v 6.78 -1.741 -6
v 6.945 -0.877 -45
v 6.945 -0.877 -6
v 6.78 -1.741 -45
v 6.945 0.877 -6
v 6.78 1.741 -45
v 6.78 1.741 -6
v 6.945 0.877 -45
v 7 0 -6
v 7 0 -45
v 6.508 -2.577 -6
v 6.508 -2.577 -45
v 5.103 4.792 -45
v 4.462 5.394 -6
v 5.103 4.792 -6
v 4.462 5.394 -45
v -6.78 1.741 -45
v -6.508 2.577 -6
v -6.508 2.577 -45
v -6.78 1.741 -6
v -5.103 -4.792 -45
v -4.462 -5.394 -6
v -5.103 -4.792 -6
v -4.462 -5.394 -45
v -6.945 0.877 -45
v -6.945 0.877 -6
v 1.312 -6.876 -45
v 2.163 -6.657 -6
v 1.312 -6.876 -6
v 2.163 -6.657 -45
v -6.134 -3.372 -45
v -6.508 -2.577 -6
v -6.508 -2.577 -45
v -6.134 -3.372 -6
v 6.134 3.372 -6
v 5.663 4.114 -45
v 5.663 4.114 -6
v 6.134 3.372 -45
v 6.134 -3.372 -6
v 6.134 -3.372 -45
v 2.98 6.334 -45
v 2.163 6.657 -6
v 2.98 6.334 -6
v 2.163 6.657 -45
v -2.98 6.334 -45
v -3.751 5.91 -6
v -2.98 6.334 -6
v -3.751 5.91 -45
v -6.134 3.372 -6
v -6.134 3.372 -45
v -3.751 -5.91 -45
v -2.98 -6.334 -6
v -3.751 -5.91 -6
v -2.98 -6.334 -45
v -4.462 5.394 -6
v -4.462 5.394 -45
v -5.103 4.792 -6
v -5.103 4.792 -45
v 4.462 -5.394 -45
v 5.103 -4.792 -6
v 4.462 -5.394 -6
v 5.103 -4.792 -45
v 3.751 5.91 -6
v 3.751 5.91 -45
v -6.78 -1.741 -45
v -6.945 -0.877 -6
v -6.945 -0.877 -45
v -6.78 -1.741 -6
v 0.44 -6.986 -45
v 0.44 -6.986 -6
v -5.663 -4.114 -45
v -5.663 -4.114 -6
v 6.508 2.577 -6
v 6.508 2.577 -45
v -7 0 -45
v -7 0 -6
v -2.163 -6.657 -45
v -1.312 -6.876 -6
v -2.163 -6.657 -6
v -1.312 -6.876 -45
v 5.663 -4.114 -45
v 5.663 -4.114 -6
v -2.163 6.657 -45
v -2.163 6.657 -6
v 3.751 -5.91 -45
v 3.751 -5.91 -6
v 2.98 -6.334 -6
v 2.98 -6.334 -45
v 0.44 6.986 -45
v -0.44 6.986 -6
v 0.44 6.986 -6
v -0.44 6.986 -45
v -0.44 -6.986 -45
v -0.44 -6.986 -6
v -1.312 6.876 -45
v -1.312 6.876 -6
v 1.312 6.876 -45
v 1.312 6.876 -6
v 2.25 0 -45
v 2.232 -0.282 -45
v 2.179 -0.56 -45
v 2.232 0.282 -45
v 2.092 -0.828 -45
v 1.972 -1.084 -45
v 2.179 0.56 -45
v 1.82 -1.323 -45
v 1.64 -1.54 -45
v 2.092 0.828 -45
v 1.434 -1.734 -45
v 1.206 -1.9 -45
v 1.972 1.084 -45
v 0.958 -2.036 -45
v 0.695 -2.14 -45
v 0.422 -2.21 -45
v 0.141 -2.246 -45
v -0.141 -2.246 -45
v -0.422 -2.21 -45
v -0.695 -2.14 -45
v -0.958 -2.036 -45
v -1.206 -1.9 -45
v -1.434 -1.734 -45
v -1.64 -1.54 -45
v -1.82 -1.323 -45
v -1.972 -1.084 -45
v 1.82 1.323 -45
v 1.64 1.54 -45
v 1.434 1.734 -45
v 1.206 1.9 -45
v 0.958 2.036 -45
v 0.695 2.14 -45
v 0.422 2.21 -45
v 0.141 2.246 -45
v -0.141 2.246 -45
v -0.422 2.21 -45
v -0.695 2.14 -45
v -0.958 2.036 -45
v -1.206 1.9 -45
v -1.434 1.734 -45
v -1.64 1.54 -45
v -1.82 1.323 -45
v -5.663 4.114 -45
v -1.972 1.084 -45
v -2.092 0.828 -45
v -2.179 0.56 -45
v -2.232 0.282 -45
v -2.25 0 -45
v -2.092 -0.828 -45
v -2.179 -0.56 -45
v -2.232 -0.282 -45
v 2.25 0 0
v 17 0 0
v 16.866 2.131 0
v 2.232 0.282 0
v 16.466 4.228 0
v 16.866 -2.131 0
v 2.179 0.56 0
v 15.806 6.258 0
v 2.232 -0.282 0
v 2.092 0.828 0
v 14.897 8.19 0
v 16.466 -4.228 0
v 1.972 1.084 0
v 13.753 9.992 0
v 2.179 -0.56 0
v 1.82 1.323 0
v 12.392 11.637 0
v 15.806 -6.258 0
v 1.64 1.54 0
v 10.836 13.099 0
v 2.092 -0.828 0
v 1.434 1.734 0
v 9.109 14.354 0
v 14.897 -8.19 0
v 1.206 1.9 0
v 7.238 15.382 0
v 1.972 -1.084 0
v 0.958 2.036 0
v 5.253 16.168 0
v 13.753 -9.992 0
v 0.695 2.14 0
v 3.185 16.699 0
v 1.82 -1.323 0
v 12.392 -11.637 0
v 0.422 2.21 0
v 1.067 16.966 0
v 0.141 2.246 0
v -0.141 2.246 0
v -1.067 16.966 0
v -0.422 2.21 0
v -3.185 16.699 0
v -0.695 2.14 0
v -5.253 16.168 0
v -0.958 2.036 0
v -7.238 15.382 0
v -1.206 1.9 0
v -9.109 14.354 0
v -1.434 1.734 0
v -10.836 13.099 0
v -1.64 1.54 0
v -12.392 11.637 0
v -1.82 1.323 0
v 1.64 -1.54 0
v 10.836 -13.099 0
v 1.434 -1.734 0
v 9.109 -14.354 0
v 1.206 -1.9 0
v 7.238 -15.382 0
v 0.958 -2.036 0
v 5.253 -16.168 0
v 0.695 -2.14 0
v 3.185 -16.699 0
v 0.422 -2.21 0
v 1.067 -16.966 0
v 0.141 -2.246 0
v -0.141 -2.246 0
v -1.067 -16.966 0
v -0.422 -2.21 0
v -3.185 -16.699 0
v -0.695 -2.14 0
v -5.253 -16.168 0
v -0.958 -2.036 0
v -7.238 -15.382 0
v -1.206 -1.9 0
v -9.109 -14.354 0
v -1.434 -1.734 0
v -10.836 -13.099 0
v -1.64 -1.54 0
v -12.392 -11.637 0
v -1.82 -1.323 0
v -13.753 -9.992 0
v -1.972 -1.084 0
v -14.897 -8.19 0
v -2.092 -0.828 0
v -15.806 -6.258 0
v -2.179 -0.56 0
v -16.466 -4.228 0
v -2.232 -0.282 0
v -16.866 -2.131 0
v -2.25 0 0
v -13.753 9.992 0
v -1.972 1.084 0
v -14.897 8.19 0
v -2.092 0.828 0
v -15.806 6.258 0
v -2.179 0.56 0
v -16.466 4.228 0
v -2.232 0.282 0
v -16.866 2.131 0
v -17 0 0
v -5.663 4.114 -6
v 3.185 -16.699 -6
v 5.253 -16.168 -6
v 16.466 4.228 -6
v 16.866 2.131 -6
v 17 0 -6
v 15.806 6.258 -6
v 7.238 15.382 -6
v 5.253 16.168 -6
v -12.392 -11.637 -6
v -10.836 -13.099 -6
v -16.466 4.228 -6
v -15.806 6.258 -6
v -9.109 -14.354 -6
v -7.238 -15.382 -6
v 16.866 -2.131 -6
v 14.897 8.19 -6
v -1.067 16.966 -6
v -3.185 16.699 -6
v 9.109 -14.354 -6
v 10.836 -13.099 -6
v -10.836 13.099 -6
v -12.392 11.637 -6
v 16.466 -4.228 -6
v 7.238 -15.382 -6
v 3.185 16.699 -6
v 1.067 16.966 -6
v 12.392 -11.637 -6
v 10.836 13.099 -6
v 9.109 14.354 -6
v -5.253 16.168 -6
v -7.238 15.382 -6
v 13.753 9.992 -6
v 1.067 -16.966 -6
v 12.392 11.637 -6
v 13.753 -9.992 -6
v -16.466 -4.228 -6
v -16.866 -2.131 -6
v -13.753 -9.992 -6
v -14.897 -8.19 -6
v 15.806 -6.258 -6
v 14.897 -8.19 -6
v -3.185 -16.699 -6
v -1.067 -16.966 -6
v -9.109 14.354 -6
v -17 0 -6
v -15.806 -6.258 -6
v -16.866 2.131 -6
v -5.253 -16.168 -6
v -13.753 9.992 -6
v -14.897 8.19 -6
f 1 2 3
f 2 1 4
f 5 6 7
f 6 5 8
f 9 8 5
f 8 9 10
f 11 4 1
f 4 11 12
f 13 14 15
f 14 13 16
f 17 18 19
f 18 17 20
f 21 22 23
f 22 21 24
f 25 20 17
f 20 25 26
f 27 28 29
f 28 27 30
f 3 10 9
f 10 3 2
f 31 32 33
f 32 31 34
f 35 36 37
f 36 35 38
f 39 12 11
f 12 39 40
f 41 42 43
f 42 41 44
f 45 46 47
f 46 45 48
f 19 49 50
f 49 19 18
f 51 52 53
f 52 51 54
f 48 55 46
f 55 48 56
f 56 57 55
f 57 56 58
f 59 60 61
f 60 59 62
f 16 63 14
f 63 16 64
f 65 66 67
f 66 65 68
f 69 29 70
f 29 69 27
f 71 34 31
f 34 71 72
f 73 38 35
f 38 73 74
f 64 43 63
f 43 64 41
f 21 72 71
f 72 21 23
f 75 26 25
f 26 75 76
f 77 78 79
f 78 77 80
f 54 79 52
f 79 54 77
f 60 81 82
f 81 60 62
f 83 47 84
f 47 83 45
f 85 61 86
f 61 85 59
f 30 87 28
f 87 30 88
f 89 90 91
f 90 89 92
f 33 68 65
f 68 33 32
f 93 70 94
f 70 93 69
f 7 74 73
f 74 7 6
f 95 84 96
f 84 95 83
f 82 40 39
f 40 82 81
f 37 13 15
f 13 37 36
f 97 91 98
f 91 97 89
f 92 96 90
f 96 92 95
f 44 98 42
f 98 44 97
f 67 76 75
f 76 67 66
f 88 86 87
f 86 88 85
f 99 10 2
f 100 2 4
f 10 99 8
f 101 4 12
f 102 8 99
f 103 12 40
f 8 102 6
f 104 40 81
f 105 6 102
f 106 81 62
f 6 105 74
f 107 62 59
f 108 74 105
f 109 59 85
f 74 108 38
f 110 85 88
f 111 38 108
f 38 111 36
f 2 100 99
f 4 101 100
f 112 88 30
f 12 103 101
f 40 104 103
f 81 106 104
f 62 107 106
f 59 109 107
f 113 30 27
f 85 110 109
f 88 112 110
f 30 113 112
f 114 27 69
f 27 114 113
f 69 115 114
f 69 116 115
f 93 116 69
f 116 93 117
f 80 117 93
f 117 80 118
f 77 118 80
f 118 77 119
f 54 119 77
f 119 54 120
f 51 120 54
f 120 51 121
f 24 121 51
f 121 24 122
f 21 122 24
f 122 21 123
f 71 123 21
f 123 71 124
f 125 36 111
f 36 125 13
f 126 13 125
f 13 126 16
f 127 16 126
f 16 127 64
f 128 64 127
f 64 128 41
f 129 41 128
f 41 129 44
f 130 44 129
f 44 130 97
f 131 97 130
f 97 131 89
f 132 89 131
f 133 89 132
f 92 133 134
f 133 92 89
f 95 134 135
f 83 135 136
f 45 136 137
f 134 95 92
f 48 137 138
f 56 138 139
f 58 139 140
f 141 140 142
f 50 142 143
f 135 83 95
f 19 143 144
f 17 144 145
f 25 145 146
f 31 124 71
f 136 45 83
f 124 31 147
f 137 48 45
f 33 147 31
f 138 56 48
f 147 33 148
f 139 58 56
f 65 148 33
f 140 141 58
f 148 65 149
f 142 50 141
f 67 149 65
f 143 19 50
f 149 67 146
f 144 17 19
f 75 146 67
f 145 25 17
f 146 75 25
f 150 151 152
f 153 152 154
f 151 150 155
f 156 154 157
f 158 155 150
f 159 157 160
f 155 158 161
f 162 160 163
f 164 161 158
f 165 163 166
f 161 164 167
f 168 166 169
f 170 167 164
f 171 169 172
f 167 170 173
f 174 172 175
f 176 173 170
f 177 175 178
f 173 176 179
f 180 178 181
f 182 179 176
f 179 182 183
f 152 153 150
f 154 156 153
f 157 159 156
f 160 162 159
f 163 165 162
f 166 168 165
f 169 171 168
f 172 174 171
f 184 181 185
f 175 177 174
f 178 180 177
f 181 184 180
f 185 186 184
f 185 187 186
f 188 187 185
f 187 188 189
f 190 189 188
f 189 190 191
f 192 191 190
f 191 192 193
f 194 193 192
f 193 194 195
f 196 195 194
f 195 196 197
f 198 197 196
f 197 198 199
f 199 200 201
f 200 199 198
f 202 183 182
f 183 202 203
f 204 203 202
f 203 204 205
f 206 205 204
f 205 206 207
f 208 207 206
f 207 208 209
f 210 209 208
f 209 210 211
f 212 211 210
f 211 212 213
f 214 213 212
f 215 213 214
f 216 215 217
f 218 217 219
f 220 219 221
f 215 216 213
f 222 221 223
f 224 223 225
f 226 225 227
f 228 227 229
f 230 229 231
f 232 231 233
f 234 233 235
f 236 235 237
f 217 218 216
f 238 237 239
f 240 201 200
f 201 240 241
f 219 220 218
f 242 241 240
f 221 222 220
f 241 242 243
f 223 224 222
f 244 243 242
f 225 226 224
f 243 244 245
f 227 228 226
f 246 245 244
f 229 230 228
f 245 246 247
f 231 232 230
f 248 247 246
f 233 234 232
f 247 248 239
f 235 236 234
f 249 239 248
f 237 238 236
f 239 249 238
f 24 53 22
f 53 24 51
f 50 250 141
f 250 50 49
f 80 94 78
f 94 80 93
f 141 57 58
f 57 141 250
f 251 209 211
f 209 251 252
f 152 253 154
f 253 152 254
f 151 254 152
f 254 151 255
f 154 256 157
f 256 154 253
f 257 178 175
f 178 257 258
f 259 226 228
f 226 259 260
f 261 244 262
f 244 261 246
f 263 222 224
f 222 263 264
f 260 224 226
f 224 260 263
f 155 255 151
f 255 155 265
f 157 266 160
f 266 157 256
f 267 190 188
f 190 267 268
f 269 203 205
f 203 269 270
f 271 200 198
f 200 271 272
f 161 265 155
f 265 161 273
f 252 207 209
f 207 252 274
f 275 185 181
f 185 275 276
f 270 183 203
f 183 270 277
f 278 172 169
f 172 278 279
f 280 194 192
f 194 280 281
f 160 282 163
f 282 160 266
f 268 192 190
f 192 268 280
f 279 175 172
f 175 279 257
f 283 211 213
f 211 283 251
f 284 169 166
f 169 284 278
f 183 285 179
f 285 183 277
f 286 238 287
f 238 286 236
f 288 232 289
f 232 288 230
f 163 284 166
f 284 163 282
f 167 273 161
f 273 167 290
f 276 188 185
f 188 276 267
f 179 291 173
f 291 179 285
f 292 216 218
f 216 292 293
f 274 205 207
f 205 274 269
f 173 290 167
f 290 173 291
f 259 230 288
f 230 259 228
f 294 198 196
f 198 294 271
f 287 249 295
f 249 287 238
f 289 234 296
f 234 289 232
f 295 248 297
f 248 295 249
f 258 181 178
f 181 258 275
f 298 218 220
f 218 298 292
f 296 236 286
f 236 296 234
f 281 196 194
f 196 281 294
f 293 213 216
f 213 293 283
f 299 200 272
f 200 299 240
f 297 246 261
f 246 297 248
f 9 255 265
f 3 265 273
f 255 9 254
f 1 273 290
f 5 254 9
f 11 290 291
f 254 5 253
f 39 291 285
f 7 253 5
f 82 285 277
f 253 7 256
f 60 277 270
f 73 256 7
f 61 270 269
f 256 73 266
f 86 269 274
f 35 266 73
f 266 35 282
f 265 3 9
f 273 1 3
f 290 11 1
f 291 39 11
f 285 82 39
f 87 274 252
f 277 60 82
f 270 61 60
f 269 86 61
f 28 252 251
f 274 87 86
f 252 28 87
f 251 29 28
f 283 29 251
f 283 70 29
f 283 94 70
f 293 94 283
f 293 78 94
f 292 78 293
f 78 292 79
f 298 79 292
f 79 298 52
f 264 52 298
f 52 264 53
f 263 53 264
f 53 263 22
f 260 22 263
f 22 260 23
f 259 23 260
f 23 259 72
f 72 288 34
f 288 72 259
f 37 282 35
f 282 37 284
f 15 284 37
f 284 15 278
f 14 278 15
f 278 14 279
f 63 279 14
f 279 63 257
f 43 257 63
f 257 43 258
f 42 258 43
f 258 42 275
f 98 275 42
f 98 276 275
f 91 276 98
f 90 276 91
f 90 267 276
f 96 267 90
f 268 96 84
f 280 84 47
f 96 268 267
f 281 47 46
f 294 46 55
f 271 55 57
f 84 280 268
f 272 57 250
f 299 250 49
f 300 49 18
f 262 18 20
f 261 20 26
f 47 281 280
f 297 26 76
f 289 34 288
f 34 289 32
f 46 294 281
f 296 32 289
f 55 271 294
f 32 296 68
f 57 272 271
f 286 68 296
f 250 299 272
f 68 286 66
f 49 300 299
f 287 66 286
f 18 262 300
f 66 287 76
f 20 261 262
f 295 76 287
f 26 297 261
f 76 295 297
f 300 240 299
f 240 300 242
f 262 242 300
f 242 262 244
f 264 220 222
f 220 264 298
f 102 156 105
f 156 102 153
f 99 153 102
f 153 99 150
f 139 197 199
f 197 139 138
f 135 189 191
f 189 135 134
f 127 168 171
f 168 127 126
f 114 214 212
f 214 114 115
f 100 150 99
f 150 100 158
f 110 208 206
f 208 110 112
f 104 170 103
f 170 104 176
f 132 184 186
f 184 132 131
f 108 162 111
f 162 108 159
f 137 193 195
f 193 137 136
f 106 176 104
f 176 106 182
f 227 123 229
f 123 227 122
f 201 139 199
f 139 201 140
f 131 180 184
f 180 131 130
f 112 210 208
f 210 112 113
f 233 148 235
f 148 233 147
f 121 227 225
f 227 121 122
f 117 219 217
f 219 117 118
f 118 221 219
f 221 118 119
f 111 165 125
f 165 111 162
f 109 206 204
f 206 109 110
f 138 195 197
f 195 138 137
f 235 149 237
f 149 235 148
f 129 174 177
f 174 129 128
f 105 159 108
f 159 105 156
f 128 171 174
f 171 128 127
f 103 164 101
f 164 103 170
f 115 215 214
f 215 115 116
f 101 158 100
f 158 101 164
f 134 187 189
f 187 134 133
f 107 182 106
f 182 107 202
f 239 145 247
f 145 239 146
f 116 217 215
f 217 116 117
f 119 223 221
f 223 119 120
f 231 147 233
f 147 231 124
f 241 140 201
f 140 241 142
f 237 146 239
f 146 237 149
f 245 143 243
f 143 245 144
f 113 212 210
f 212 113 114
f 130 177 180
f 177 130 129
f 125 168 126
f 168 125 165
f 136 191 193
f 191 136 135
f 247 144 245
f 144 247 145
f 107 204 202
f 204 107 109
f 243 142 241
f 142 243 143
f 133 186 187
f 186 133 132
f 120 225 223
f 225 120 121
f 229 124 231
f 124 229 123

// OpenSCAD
$fn = 50;


difference() {
	union() {
		translate(v = [0, 0, -45.0000000000]) {
			cylinder(h = 45, r = 7.0000000000);
		}
		translate(v = [0, 0, -6.0000000000]) {
			cylinder(h = 6, r = 17.0000000000);
		}
	}
	union() {
		#translate(v = [0, 0, -45]) {
			cylinder(h = 45, r = 2.2500000000);
		}
	}
}
